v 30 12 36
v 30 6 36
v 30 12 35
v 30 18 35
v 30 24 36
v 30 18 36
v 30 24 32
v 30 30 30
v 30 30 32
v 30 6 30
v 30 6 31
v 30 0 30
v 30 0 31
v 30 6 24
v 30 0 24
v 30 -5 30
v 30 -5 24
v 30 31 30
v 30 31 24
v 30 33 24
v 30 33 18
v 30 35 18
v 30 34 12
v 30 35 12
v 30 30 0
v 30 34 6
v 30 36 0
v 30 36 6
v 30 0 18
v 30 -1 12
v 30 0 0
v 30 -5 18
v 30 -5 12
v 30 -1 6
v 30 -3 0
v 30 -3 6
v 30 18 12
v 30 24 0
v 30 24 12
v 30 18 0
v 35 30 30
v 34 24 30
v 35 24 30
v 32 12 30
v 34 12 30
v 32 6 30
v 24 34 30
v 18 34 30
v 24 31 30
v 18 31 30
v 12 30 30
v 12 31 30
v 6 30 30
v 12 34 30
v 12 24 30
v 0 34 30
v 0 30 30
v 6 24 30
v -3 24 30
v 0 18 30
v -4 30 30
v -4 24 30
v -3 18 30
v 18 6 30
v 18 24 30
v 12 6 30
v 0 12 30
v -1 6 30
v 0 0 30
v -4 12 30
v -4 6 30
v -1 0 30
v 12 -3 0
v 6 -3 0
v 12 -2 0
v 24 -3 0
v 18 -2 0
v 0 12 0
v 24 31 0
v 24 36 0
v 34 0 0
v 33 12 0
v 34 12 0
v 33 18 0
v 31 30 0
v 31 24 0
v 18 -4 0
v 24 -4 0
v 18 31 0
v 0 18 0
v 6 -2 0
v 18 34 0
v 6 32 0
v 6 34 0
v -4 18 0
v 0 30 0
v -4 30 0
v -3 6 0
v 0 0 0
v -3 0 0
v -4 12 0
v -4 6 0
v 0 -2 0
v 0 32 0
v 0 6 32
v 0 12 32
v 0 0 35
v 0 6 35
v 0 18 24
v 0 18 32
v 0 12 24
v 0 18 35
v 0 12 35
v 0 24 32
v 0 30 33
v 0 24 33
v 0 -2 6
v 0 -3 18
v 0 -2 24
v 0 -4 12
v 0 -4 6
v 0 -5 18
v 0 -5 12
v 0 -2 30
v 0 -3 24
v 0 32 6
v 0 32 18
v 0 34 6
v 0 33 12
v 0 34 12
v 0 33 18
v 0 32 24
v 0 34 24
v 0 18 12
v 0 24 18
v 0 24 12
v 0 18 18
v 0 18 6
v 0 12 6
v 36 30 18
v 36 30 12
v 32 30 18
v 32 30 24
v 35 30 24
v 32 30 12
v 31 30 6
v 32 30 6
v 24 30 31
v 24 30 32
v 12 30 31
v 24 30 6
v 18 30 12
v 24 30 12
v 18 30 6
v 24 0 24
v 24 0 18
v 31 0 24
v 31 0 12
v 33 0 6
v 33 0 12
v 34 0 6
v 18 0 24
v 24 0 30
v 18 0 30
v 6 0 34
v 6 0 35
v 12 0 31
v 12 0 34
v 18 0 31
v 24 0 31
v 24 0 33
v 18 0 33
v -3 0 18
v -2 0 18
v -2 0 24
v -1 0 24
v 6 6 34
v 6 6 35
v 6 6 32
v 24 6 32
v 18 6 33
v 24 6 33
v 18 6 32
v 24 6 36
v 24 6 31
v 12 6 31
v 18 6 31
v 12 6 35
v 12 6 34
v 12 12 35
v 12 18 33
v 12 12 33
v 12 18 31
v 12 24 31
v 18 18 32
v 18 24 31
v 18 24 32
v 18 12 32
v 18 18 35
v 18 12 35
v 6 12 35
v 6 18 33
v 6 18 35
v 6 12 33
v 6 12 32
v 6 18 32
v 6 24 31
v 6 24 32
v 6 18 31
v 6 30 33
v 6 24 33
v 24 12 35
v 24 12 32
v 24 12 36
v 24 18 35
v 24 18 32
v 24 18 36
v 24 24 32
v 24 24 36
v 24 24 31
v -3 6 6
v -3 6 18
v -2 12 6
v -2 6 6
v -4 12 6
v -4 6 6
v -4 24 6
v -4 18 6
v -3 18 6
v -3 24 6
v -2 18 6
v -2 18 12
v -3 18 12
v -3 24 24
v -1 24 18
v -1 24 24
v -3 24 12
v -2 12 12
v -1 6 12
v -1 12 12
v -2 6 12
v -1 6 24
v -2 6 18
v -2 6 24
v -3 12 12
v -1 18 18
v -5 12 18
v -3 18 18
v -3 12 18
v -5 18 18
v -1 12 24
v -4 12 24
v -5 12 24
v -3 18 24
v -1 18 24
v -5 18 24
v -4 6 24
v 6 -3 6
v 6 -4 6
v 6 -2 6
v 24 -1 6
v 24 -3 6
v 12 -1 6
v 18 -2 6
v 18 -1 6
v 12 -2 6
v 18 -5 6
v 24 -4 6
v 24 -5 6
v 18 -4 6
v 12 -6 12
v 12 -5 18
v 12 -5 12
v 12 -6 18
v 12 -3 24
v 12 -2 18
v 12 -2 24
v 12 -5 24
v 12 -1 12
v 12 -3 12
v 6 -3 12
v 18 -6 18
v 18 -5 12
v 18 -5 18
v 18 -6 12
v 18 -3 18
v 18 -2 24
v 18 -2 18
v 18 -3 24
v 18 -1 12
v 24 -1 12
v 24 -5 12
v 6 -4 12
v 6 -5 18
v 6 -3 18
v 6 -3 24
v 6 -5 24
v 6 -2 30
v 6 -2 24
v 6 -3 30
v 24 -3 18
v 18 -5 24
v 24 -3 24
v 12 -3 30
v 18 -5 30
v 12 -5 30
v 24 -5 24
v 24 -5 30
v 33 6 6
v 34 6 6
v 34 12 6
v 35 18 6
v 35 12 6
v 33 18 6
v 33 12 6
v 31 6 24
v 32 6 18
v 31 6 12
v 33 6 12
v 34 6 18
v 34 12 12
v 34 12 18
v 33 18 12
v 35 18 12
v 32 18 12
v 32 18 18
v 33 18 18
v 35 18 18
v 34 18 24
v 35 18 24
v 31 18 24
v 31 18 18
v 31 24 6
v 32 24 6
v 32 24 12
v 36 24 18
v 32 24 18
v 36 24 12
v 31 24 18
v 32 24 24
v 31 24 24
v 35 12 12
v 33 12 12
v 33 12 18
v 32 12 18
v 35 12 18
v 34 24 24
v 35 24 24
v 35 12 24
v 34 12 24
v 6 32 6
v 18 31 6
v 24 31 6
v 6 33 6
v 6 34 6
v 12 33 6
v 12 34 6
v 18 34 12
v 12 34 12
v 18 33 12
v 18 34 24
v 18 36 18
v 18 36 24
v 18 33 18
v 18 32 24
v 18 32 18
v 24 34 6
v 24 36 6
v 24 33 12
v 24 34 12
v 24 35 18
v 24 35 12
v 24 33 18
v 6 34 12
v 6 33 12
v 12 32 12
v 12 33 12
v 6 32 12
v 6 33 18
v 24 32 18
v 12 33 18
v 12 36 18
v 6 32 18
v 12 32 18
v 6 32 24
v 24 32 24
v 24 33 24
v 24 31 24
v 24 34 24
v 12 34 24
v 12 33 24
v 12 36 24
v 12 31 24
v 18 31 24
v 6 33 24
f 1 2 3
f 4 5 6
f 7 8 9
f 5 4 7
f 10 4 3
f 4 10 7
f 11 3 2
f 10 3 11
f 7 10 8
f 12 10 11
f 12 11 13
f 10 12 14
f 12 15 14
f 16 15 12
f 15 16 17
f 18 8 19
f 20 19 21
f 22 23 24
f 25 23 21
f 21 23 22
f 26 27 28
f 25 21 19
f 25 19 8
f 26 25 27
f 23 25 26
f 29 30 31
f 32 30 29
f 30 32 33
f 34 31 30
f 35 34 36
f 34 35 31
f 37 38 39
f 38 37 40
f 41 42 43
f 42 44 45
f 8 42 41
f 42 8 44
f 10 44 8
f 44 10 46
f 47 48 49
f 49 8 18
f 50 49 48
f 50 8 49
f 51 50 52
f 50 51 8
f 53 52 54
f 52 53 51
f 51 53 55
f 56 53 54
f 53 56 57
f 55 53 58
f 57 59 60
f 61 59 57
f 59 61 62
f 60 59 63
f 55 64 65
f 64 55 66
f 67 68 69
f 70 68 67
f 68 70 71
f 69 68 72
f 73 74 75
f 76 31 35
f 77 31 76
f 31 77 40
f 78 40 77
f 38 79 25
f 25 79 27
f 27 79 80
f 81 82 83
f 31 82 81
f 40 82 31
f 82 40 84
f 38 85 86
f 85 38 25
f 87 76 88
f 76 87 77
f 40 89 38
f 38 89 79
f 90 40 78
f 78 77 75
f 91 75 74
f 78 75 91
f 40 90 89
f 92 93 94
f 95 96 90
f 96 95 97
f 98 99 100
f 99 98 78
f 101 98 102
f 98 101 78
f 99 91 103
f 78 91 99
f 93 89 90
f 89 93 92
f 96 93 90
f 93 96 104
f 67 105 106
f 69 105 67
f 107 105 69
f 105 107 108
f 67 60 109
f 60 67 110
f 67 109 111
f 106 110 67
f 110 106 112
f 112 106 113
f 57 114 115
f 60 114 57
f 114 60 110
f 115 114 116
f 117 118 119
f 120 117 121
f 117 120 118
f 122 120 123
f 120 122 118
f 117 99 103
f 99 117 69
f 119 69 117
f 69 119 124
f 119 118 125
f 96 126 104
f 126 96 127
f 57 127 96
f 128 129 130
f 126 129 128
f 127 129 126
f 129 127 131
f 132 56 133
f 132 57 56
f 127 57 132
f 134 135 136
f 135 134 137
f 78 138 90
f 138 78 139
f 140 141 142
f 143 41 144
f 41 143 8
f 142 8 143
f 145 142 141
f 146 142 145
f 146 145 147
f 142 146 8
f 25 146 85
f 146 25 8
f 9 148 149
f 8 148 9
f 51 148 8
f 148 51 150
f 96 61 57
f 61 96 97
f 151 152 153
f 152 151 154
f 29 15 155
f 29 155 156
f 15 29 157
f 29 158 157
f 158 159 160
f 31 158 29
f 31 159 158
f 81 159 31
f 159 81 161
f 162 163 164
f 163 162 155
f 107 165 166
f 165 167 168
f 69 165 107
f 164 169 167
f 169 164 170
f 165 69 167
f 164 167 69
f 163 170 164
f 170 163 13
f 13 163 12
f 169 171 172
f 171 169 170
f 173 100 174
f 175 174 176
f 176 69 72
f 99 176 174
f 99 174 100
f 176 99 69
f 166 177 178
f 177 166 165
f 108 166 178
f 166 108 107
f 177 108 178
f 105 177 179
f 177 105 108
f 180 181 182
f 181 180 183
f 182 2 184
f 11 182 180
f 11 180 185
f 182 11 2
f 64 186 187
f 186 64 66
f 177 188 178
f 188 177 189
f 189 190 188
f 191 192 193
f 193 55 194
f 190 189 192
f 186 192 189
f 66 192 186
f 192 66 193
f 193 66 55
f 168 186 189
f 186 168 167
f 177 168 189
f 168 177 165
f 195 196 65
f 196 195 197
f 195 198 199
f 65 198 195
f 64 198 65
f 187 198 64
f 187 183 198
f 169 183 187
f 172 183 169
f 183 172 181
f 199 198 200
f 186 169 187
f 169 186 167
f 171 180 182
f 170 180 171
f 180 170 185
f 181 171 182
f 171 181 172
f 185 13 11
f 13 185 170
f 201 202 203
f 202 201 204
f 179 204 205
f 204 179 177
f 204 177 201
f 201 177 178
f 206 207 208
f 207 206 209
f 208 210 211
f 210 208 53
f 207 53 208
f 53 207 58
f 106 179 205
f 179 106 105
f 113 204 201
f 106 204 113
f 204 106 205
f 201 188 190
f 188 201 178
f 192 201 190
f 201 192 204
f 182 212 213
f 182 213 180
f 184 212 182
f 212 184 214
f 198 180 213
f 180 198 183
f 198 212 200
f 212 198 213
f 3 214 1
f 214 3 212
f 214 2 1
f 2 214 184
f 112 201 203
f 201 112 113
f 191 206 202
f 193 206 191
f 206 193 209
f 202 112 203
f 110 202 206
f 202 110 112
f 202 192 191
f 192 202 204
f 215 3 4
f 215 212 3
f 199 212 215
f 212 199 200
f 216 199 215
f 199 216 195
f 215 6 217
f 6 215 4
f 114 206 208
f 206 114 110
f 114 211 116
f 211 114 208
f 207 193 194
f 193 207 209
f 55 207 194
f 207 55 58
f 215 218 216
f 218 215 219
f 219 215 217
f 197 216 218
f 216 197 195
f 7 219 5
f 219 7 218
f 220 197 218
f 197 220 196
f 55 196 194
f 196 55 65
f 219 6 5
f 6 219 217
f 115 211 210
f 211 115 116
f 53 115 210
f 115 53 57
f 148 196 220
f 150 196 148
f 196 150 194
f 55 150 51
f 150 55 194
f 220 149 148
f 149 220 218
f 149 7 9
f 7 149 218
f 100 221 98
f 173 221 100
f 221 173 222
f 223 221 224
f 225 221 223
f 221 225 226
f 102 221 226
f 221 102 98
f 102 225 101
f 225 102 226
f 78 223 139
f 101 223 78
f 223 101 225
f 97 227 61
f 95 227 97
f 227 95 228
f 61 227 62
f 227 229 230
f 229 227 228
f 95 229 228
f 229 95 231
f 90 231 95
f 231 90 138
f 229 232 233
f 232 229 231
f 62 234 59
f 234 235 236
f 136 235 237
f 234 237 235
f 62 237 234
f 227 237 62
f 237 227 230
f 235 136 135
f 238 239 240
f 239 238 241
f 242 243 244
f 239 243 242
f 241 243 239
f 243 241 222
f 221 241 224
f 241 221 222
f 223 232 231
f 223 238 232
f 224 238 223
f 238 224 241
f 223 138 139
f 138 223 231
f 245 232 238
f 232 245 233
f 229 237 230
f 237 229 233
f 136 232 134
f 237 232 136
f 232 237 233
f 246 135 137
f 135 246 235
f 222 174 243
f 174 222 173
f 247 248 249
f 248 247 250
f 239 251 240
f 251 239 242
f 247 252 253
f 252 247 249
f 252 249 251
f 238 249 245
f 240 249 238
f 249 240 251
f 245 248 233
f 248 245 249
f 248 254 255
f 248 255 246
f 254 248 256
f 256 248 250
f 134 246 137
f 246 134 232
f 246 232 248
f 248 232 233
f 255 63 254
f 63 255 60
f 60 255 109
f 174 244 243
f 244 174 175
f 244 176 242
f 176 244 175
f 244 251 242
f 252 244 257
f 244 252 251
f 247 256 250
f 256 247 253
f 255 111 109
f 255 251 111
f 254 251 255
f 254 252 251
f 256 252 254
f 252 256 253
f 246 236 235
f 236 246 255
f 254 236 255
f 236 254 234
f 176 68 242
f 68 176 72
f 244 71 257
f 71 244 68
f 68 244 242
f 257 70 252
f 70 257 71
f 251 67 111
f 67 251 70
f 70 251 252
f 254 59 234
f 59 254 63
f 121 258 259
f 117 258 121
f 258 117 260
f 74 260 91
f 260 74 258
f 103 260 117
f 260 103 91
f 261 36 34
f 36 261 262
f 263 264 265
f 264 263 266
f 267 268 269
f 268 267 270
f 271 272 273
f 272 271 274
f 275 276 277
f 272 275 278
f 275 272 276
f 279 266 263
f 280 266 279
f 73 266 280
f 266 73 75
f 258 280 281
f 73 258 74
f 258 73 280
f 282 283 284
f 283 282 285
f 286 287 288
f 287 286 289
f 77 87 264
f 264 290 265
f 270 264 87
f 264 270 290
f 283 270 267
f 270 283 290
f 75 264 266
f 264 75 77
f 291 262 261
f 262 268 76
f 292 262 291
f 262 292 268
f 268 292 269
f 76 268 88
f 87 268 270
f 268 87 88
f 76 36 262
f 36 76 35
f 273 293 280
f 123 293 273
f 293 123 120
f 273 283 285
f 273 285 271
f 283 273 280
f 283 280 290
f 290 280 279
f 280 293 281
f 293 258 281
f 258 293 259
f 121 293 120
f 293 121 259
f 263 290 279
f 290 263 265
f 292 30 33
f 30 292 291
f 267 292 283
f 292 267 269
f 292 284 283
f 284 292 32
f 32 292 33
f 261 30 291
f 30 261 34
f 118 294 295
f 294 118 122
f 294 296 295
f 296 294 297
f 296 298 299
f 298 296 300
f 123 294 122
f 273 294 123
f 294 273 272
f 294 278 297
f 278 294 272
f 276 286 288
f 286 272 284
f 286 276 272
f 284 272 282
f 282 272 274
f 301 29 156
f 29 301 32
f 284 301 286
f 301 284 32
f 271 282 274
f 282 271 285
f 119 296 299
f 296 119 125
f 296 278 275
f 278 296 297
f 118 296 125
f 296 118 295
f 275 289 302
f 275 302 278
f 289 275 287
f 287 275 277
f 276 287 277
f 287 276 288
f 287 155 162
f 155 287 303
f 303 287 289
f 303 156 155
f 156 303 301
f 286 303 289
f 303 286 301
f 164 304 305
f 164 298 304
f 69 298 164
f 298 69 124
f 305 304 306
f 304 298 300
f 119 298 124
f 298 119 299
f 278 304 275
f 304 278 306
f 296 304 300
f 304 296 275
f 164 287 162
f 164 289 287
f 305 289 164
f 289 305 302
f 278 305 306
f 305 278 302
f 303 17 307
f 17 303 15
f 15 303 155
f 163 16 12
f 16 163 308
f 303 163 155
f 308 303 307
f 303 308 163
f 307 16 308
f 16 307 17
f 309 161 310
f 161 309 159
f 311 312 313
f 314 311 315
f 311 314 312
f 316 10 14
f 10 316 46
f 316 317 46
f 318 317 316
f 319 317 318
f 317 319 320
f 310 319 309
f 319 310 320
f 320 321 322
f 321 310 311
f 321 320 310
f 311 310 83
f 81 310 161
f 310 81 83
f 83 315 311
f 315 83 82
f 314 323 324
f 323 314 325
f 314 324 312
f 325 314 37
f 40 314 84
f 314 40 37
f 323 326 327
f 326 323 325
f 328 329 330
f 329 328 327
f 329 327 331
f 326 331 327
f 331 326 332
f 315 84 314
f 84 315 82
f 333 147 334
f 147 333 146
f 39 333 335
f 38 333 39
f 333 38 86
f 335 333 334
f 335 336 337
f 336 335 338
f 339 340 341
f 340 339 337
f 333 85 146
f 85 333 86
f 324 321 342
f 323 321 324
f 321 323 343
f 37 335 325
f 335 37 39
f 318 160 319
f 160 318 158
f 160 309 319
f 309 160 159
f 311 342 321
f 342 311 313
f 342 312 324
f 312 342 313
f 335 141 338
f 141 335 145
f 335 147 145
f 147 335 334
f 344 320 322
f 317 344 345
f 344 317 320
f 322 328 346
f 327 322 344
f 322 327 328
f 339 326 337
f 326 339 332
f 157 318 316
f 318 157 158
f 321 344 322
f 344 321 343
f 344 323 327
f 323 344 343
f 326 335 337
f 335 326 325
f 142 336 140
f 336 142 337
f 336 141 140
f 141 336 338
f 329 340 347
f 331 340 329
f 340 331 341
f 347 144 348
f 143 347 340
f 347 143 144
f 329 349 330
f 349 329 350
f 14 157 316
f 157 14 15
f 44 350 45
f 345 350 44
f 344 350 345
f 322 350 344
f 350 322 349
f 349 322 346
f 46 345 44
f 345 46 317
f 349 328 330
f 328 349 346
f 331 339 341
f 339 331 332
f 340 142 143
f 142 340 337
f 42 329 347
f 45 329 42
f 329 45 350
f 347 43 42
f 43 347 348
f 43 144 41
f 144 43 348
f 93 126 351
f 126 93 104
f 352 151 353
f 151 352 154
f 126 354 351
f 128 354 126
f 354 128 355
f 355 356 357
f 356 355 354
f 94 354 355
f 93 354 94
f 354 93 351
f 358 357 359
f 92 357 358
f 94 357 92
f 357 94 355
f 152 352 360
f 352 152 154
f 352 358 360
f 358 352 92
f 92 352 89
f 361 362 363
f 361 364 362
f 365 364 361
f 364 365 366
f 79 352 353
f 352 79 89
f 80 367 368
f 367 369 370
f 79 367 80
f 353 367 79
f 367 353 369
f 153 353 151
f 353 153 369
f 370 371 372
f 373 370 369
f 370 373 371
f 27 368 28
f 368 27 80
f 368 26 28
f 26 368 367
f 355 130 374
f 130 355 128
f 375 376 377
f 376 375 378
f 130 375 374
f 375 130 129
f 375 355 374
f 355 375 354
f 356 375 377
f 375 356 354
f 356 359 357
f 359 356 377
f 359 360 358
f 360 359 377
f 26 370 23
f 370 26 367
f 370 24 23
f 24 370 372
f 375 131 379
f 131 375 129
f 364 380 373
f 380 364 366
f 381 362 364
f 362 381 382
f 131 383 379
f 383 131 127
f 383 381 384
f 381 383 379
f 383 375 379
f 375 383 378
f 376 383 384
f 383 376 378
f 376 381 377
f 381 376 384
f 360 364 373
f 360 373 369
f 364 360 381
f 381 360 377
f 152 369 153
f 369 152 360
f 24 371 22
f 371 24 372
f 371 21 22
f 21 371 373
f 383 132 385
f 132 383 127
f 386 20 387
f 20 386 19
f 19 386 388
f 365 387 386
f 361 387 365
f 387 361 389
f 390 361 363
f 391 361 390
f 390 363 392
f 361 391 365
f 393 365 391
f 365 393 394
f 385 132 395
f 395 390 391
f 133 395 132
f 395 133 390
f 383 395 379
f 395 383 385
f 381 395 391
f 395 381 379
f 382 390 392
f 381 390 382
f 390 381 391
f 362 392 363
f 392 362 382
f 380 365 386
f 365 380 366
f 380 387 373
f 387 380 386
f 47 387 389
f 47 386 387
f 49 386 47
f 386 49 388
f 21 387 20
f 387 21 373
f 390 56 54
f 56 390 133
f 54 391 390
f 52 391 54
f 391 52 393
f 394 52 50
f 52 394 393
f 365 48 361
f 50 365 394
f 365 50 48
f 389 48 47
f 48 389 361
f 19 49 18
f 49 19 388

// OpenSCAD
//created with rubyscad 1.0.7

union() {
   cube(size = [30, 30, 30]); 
   translate(v = [0.0, 0.0, 30]) {
      cube(size = [6.0, 6.0, 5]); 
   }
   translate(v = [6.0, 0.0, 30]) {
      cube(size = [6.0, 6.0, 4]); 
   }
   translate(v = [12.0, 0.0, 30]) {
      cube(size = [6.0, 6.0, 1]); 
   }
   translate(v = [18.0, 0.0, 30]) {
      cube(size = [6.0, 6.0, 3]); 
   }
   translate(v = [24.0, 0.0, 30]) {
      cube(size = [6.0, 6.0, 1]); 
   }
   translate(v = [0.0, 6.0, 30]) {
      cube(size = [6.0, 6.0, 2]); 
   }
   translate(v = [6.0, 6.0, 30]) {
      cube(size = [6.0, 6.0, 5]); 
   }
   translate(v = [12.0, 6.0, 30]) {
      cube(size = [6.0, 6.0, 0]); 
   }
   translate(v = [18.0, 6.0, 30]) {
      cube(size = [6.0, 6.0, 2]); 
   }
   translate(v = [24.0, 6.0, 30]) {
      cube(size = [6.0, 6.0, 6]); 
   }
   translate(v = [0.0, 12.0, 30]) {
      cube(size = [6.0, 6.0, 5]); 
   }
   translate(v = [6.0, 12.0, 30]) {
      cube(size = [6.0, 6.0, 3]); 
   }
   translate(v = [12.0, 12.0, 30]) {
      cube(size = [6.0, 6.0, 0]); 
   }
   translate(v = [18.0, 12.0, 30]) {
      cube(size = [6.0, 6.0, 5]); 
   }
   translate(v = [24.0, 12.0, 30]) {
      cube(size = [6.0, 6.0, 5]); 
   }
   translate(v = [0.0, 18.0, 30]) {
      cube(size = [6.0, 6.0, 2]); 
   }
   translate(v = [6.0, 18.0, 30]) {
      cube(size = [6.0, 6.0, 1]); 
   }
   translate(v = [12.0, 18.0, 30]) {
      cube(size = [6.0, 6.0, 0]); 
   }
   translate(v = [18.0, 18.0, 30]) {
      cube(size = [6.0, 6.0, 2]); 
   }
   translate(v = [24.0, 18.0, 30]) {
      cube(size = [6.0, 6.0, 6]); 
   }
   translate(v = [0.0, 24.0, 30]) {
      cube(size = [6.0, 6.0, 3]); 
   }
   translate(v = [6.0, 24.0, 30]) {
      cube(size = [6.0, 6.0, 0]); 
   }
   translate(v = [12.0, 24.0, 30]) {
      cube(size = [6.0, 6.0, 1]); 
   }
   translate(v = [18.0, 24.0, 30]) {
      cube(size = [6.0, 6.0, 1]); 
   }
   translate(v = [24.0, 24.0, 30]) {
      cube(size = [6.0, 6.0, 2]); 
   }
   rotate(a = [0, 180, 0]) {
      translate(v = [0, 0.0, -6.0]) {
         cube(size = [3, 6.0, 6.0]); 
      }
   }
   rotate(a = [0, 180, 0]) {
      translate(v = [0, 6.0, -6.0]) {
         cube(size = [4, 6.0, 6.0]); 
      }
   }
   rotate(a = [0, 180, 0]) {
      translate(v = [0, 12.0, -6.0]) {
         cube(size = [0, 6.0, 6.0]); 
      }
   }
   rotate(a = [0, 180, 0]) {
      translate(v = [0, 18.0, -6.0]) {
         cube(size = [4, 6.0, 6.0]); 
      }
   }
   rotate(a = [0, 180, 0]) {
      translate(v = [0, 24.0, -6.0]) {
         cube(size = [4, 6.0, 6.0]); 
      }
   }
   rotate(a = [0, 180, 0]) {
      translate(v = [0, 0.0, -12.0]) {
         cube(size = [3, 6.0, 6.0]); 
      }
   }
   rotate(a = [0, 180, 0]) {
      translate(v = [0, 6.0, -12.0]) {
         cube(size = [2, 6.0, 6.0]); 
      }
   }
   rotate(a = [0, 180, 0]) {
      translate(v = [0, 12.0, -12.0]) {
         cube(size = [2, 6.0, 6.0]); 
      }
   }
   rotate(a = [0, 180, 0]) {
      translate(v = [0, 18.0, -12.0]) {
         cube(size = [3, 6.0, 6.0]); 
      }
   }
   rotate(a = [0, 180, 0]) {
      translate(v = [0, 24.0, -12.0]) {
         cube(size = [4, 6.0, 6.0]); 
      }
   }
   rotate(a = [0, 180, 0]) {
      translate(v = [0, 0.0, -18.0]) {
         cube(size = [3, 6.0, 6.0]); 
      }
   }
   rotate(a = [0, 180, 0]) {
      translate(v = [0, 6.0, -18.0]) {
         cube(size = [1, 6.0, 6.0]); 
      }
   }
   rotate(a = [0, 180, 0]) {
      translate(v = [0, 12.0, -18.0]) {
         cube(size = [3, 6.0, 6.0]); 
      }
   }
   rotate(a = [0, 180, 0]) {
      translate(v = [0, 18.0, -18.0]) {
         cube(size = [0, 6.0, 6.0]); 
      }
   }
   rotate(a = [0, 180, 0]) {
      translate(v = [0, 24.0, -18.0]) {
         cube(size = [4, 6.0, 6.0]); 
      }
   }
   rotate(a = [0, 180, 0]) {
      translate(v = [0, 0.0, -24.0]) {
         cube(size = [2, 6.0, 6.0]); 
      }
   }
   rotate(a = [0, 180, 0]) {
      translate(v = [0, 6.0, -24.0]) {
         cube(size = [1, 6.0, 6.0]); 
      }
   }
   rotate(a = [0, 180, 0]) {
      translate(v = [0, 12.0, -24.0]) {
         cube(size = [5, 6.0, 6.0]); 
      }
   }
   rotate(a = [0, 180, 0]) {
      translate(v = [0, 18.0, -24.0]) {
         cube(size = [1, 6.0, 6.0]); 
      }
   }
   rotate(a = [0, 180, 0]) {
      translate(v = [0, 24.0, -24.0]) {
         cube(size = [4, 6.0, 6.0]); 
      }
   }
   rotate(a = [0, 180, 0]) {
      translate(v = [0, 0.0, -30.0]) {
         cube(size = [1, 6.0, 6.0]); 
      }
   }
   rotate(a = [0, 180, 0]) {
      translate(v = [0, 6.0, -30.0]) {
         cube(size = [4, 6.0, 6.0]); 
      }
   }
   rotate(a = [0, 180, 0]) {
      translate(v = [0, 12.0, -30.0]) {
         cube(size = [0, 6.0, 6.0]); 
      }
   }
   rotate(a = [0, 180, 0]) {
      translate(v = [0, 18.0, -30.0]) {
         cube(size = [3, 6.0, 6.0]); 
      }
   }
   rotate(a = [0, 180, 0]) {
      translate(v = [0, 24.0, -30.0]) {
         cube(size = [4, 6.0, 6.0]); 
      }
   }
   rotate(a = [0, 180, 90]) {
      translate(v = [0, -6.0, -6.0]) {
         cube(size = [2, 6.0, 6.0]); 
      }
   }
   rotate(a = [0, 180, 90]) {
      translate(v = [0, -12.0, -6.0]) {
         cube(size = [3, 6.0, 6.0]); 
      }
   }
   rotate(a = [0, 180, 90]) {
      translate(v = [0, -18.0, -6.0]) {
         cube(size = [2, 6.0, 6.0]); 
      }
   }
   rotate(a = [0, 180, 90]) {
      translate(v = [0, -24.0, -6.0]) {
         cube(size = [4, 6.0, 6.0]); 
      }
   }
   rotate(a = [0, 180, 90]) {
      translate(v = [0, -30.0, -6.0]) {
         cube(size = [3, 6.0, 6.0]); 
      }
   }
   rotate(a = [0, 180, 90]) {
      translate(v = [0, -6.0, -12.0]) {
         cube(size = [4, 6.0, 6.0]); 
      }
   }
   rotate(a = [0, 180, 90]) {
      translate(v = [0, -12.0, -12.0]) {
         cube(size = [3, 6.0, 6.0]); 
      }
   }
   rotate(a = [0, 180, 90]) {
      translate(v = [0, -18.0, -12.0]) {
         cube(size = [1, 6.0, 6.0]); 
      }
   }
   rotate(a = [0, 180, 90]) {
      translate(v = [0, -24.0, -12.0]) {
         cube(size = [5, 6.0, 6.0]); 
      }
   }
   rotate(a = [0, 180, 90]) {
      translate(v = [0, -30.0, -12.0]) {
         cube(size = [1, 6.0, 6.0]); 
      }
   }
   rotate(a = [0, 180, 90]) {
      translate(v = [0, -6.0, -18.0]) {
         cube(size = [5, 6.0, 6.0]); 
      }
   }
   rotate(a = [0, 180, 90]) {
      translate(v = [0, -12.0, -18.0]) {
         cube(size = [5, 6.0, 6.0]); 
      }
   }
   rotate(a = [0, 180, 90]) {
      translate(v = [0, -18.0, -18.0]) {
         cube(size = [6, 6.0, 6.0]); 
      }
   }
   rotate(a = [0, 180, 90]) {
      translate(v = [0, -24.0, -18.0]) {
         cube(size = [5, 6.0, 6.0]); 
      }
   }
   rotate(a = [0, 180, 90]) {
      translate(v = [0, -30.0, -18.0]) {
         cube(size = [5, 6.0, 6.0]); 
      }
   }
   rotate(a = [0, 180, 90]) {
      translate(v = [0, -6.0, -24.0]) {
         cube(size = [3, 6.0, 6.0]); 
      }
   }
   rotate(a = [0, 180, 90]) {
      translate(v = [0, -12.0, -24.0]) {
         cube(size = [5, 6.0, 6.0]); 
      }
   }
   rotate(a = [0, 180, 90]) {
      translate(v = [0, -18.0, -24.0]) {
         cube(size = [2, 6.0, 6.0]); 
      }
   }
   rotate(a = [0, 180, 90]) {
      translate(v = [0, -24.0, -24.0]) {
         cube(size = [3, 6.0, 6.0]); 
      }
   }
   rotate(a = [0, 180, 90]) {
      translate(v = [0, -30.0, -24.0]) {
         cube(size = [0, 6.0, 6.0]); 
      }
   }
   rotate(a = [0, 180, 90]) {
      translate(v = [0, -6.0, -30.0]) {
         cube(size = [2, 6.0, 6.0]); 
      }
   }
   rotate(a = [0, 180, 90]) {
      translate(v = [0, -12.0, -30.0]) {
         cube(size = [3, 6.0, 6.0]); 
      }
   }
   rotate(a = [0, 180, 90]) {
      translate(v = [0, -18.0, -30.0]) {
         cube(size = [5, 6.0, 6.0]); 
      }
   }
   rotate(a = [0, 180, 90]) {
      translate(v = [0, -24.0, -30.0]) {
         cube(size = [0, 6.0, 6.0]); 
      }
   }
   rotate(a = [0, 180, 90]) {
      translate(v = [0, -30.0, -30.0]) {
         cube(size = [5, 6.0, 6.0]); 
      }
   }
   rotate(a = [0, 180, 180]) {
      translate(v = [30, -6.0, -6.0]) {
         cube(size = [4, 6.0, 6.0]); 
      }
   }
   rotate(a = [0, 180, 180]) {
      translate(v = [30, -12.0, -6.0]) {
         cube(size = [4, 6.0, 6.0]); 
      }
   }
   rotate(a = [0, 180, 180]) {
      translate(v = [30, -18.0, -6.0]) {
         cube(size = [3, 6.0, 6.0]); 
      }
   }
   rotate(a = [0, 180, 180]) {
      translate(v = [30, -24.0, -6.0]) {
         cube(size = [0, 6.0, 6.0]); 
      }
   }
   rotate(a = [0, 180, 180]) {
      translate(v = [30, -30.0, -6.0]) {
         cube(size = [1, 6.0, 6.0]); 
      }
   }
   rotate(a = [0, 180, 180]) {
      translate(v = [30, -6.0, -12.0]) {
         cube(size = [3, 6.0, 6.0]); 
      }
   }
   rotate(a = [0, 180, 180]) {
      translate(v = [30, -12.0, -12.0]) {
         cube(size = [4, 6.0, 6.0]); 
      }
   }
   rotate(a = [0, 180, 180]) {
      translate(v = [30, -18.0, -12.0]) {
         cube(size = [5, 6.0, 6.0]); 
      }
   }
   rotate(a = [0, 180, 180]) {
      translate(v = [30, -24.0, -12.0]) {
         cube(size = [0, 6.0, 6.0]); 
      }
   }
   rotate(a = [0, 180, 180]) {
      translate(v = [30, -30.0, -12.0]) {
         cube(size = [2, 6.0, 6.0]); 
      }
   }
   rotate(a = [0, 180, 180]) {
      translate(v = [30, -6.0, -18.0]) {
         cube(size = [1, 6.0, 6.0]); 
      }
   }
   rotate(a = [0, 180, 180]) {
      translate(v = [30, -12.0, -18.0]) {
         cube(size = [4, 6.0, 6.0]); 
      }
   }
   rotate(a = [0, 180, 180]) {
      translate(v = [30, -18.0, -18.0]) {
         cube(size = [3, 6.0, 6.0]); 
      }
   }
   rotate(a = [0, 180, 180]) {
      translate(v = [30, -24.0, -18.0]) {
         cube(size = [2, 6.0, 6.0]); 
      }
   }
   rotate(a = [0, 180, 180]) {
      translate(v = [30, -30.0, -18.0]) {
         cube(size = [6, 6.0, 6.0]); 
      }
   }
   rotate(a = [0, 180, 180]) {
      translate(v = [30, -6.0, -24.0]) {
         cube(size = [1, 6.0, 6.0]); 
      }
   }
   rotate(a = [0, 180, 180]) {
      translate(v = [30, -12.0, -24.0]) {
         cube(size = [2, 6.0, 6.0]); 
      }
   }
   rotate(a = [0, 180, 180]) {
      translate(v = [30, -18.0, -24.0]) {
         cube(size = [5, 6.0, 6.0]); 
      }
   }
   rotate(a = [0, 180, 180]) {
      translate(v = [30, -24.0, -24.0]) {
         cube(size = [1, 6.0, 6.0]); 
      }
   }
   rotate(a = [0, 180, 180]) {
      translate(v = [30, -30.0, -24.0]) {
         cube(size = [2, 6.0, 6.0]); 
      }
   }
   rotate(a = [0, 180, 180]) {
      translate(v = [30, -6.0, -30.0]) {
         cube(size = [0, 6.0, 6.0]); 
      }
   }
   rotate(a = [0, 180, 180]) {
      translate(v = [30, -12.0, -30.0]) {
         cube(size = [2, 6.0, 6.0]); 
      }
   }
   rotate(a = [0, 180, 180]) {
      translate(v = [30, -18.0, -30.0]) {
         cube(size = [4, 6.0, 6.0]); 
      }
   }
   rotate(a = [0, 180, 180]) {
      translate(v = [30, -24.0, -30.0]) {
         cube(size = [4, 6.0, 6.0]); 
      }
   }
   rotate(a = [0, 180, 180]) {
      translate(v = [30, -30.0, -30.0]) {
         cube(size = [5, 6.0, 6.0]); 
      }
   }
   rotate(a = [0, 180, 270]) {
      translate(v = [30, 0.0, -6.0]) {
         cube(size = [2, 6.0, 6.0]); 
      }
   }
   rotate(a = [0, 180, 270]) {
      translate(v = [30, 6.0, -6.0]) {
         cube(size = [4, 6.0, 6.0]); 
      }
   }
   rotate(a = [0, 180, 270]) {
      translate(v = [30, 12.0, -6.0]) {
         cube(size = [4, 6.0, 6.0]); 
      }
   }
   rotate(a = [0, 180, 270]) {
      translate(v = [30, 18.0, -6.0]) {
         cube(size = [1, 6.0, 6.0]); 
      }
   }
   rotate(a = [0, 180, 270]) {
      translate(v = [30, 24.0, -6.0]) {
         cube(size = [6, 6.0, 6.0]); 
      }
   }
   rotate(a = [0, 180, 270]) {
      translate(v = [30, 0.0, -12.0]) {
         cube(size = [4, 6.0, 6.0]); 
      }
   }
   rotate(a = [0, 180, 270]) {
      translate(v = [30, 6.0, -12.0]) {
         cube(size = [3, 6.0, 6.0]); 
      }
   }
   rotate(a = [0, 180, 270]) {
      translate(v = [30, 12.0, -12.0]) {
         cube(size = [4, 6.0, 6.0]); 
      }
   }
   rotate(a = [0, 180, 270]) {
      translate(v = [30, 18.0, -12.0]) {
         cube(size = [0, 6.0, 6.0]); 
      }
   }
   rotate(a = [0, 180, 270]) {
      translate(v = [30, 24.0, -12.0]) {
         cube(size = [4, 6.0, 6.0]); 
      }
   }
   rotate(a = [0, 180, 270]) {
      translate(v = [30, 0.0, -18.0]) {
         cube(size = [3, 6.0, 6.0]); 
      }
   }
   rotate(a = [0, 180, 270]) {
      translate(v = [30, 6.0, -18.0]) {
         cube(size = [2, 6.0, 6.0]); 
      }
   }
   rotate(a = [0, 180, 270]) {
      translate(v = [30, 12.0, -18.0]) {
         cube(size = [3, 6.0, 6.0]); 
      }
   }
   rotate(a = [0, 180, 270]) {
      translate(v = [30, 18.0, -18.0]) {
         cube(size = [3, 6.0, 6.0]); 
      }
   }
   rotate(a = [0, 180, 270]) {
      translate(v = [30, 24.0, -18.0]) {
         cube(size = [5, 6.0, 6.0]); 
      }
   }
   rotate(a = [0, 180, 270]) {
      translate(v = [30, 0.0, -24.0]) {
         cube(size = [2, 6.0, 6.0]); 
      }
   }
   rotate(a = [0, 180, 270]) {
      translate(v = [30, 6.0, -24.0]) {
         cube(size = [3, 6.0, 6.0]); 
      }
   }
   rotate(a = [0, 180, 270]) {
      translate(v = [30, 12.0, -24.0]) {
         cube(size = [6, 6.0, 6.0]); 
      }
   }
   rotate(a = [0, 180, 270]) {
      translate(v = [30, 18.0, -24.0]) {
         cube(size = [2, 6.0, 6.0]); 
      }
   }
   rotate(a = [0, 180, 270]) {
      translate(v = [30, 24.0, -24.0]) {
         cube(size = [3, 6.0, 6.0]); 
      }
   }
   rotate(a = [0, 180, 270]) {
      translate(v = [30, 0.0, -30.0]) {
         cube(size = [4, 6.0, 6.0]); 
      }
   }
   rotate(a = [0, 180, 270]) {
      translate(v = [30, 6.0, -30.0]) {
         cube(size = [4, 6.0, 6.0]); 
      }
   }
   rotate(a = [0, 180, 270]) {
      translate(v = [30, 12.0, -30.0]) {
         cube(size = [1, 6.0, 6.0]); 
      }
   }
   rotate(a = [0, 180, 270]) {
      translate(v = [30, 18.0, -30.0]) {
         cube(size = [4, 6.0, 6.0]); 
      }
   }
   rotate(a = [0, 180, 270]) {
      translate(v = [30, 24.0, -30.0]) {
         cube(size = [1, 6.0, 6.0]); 
      }
   }
}
